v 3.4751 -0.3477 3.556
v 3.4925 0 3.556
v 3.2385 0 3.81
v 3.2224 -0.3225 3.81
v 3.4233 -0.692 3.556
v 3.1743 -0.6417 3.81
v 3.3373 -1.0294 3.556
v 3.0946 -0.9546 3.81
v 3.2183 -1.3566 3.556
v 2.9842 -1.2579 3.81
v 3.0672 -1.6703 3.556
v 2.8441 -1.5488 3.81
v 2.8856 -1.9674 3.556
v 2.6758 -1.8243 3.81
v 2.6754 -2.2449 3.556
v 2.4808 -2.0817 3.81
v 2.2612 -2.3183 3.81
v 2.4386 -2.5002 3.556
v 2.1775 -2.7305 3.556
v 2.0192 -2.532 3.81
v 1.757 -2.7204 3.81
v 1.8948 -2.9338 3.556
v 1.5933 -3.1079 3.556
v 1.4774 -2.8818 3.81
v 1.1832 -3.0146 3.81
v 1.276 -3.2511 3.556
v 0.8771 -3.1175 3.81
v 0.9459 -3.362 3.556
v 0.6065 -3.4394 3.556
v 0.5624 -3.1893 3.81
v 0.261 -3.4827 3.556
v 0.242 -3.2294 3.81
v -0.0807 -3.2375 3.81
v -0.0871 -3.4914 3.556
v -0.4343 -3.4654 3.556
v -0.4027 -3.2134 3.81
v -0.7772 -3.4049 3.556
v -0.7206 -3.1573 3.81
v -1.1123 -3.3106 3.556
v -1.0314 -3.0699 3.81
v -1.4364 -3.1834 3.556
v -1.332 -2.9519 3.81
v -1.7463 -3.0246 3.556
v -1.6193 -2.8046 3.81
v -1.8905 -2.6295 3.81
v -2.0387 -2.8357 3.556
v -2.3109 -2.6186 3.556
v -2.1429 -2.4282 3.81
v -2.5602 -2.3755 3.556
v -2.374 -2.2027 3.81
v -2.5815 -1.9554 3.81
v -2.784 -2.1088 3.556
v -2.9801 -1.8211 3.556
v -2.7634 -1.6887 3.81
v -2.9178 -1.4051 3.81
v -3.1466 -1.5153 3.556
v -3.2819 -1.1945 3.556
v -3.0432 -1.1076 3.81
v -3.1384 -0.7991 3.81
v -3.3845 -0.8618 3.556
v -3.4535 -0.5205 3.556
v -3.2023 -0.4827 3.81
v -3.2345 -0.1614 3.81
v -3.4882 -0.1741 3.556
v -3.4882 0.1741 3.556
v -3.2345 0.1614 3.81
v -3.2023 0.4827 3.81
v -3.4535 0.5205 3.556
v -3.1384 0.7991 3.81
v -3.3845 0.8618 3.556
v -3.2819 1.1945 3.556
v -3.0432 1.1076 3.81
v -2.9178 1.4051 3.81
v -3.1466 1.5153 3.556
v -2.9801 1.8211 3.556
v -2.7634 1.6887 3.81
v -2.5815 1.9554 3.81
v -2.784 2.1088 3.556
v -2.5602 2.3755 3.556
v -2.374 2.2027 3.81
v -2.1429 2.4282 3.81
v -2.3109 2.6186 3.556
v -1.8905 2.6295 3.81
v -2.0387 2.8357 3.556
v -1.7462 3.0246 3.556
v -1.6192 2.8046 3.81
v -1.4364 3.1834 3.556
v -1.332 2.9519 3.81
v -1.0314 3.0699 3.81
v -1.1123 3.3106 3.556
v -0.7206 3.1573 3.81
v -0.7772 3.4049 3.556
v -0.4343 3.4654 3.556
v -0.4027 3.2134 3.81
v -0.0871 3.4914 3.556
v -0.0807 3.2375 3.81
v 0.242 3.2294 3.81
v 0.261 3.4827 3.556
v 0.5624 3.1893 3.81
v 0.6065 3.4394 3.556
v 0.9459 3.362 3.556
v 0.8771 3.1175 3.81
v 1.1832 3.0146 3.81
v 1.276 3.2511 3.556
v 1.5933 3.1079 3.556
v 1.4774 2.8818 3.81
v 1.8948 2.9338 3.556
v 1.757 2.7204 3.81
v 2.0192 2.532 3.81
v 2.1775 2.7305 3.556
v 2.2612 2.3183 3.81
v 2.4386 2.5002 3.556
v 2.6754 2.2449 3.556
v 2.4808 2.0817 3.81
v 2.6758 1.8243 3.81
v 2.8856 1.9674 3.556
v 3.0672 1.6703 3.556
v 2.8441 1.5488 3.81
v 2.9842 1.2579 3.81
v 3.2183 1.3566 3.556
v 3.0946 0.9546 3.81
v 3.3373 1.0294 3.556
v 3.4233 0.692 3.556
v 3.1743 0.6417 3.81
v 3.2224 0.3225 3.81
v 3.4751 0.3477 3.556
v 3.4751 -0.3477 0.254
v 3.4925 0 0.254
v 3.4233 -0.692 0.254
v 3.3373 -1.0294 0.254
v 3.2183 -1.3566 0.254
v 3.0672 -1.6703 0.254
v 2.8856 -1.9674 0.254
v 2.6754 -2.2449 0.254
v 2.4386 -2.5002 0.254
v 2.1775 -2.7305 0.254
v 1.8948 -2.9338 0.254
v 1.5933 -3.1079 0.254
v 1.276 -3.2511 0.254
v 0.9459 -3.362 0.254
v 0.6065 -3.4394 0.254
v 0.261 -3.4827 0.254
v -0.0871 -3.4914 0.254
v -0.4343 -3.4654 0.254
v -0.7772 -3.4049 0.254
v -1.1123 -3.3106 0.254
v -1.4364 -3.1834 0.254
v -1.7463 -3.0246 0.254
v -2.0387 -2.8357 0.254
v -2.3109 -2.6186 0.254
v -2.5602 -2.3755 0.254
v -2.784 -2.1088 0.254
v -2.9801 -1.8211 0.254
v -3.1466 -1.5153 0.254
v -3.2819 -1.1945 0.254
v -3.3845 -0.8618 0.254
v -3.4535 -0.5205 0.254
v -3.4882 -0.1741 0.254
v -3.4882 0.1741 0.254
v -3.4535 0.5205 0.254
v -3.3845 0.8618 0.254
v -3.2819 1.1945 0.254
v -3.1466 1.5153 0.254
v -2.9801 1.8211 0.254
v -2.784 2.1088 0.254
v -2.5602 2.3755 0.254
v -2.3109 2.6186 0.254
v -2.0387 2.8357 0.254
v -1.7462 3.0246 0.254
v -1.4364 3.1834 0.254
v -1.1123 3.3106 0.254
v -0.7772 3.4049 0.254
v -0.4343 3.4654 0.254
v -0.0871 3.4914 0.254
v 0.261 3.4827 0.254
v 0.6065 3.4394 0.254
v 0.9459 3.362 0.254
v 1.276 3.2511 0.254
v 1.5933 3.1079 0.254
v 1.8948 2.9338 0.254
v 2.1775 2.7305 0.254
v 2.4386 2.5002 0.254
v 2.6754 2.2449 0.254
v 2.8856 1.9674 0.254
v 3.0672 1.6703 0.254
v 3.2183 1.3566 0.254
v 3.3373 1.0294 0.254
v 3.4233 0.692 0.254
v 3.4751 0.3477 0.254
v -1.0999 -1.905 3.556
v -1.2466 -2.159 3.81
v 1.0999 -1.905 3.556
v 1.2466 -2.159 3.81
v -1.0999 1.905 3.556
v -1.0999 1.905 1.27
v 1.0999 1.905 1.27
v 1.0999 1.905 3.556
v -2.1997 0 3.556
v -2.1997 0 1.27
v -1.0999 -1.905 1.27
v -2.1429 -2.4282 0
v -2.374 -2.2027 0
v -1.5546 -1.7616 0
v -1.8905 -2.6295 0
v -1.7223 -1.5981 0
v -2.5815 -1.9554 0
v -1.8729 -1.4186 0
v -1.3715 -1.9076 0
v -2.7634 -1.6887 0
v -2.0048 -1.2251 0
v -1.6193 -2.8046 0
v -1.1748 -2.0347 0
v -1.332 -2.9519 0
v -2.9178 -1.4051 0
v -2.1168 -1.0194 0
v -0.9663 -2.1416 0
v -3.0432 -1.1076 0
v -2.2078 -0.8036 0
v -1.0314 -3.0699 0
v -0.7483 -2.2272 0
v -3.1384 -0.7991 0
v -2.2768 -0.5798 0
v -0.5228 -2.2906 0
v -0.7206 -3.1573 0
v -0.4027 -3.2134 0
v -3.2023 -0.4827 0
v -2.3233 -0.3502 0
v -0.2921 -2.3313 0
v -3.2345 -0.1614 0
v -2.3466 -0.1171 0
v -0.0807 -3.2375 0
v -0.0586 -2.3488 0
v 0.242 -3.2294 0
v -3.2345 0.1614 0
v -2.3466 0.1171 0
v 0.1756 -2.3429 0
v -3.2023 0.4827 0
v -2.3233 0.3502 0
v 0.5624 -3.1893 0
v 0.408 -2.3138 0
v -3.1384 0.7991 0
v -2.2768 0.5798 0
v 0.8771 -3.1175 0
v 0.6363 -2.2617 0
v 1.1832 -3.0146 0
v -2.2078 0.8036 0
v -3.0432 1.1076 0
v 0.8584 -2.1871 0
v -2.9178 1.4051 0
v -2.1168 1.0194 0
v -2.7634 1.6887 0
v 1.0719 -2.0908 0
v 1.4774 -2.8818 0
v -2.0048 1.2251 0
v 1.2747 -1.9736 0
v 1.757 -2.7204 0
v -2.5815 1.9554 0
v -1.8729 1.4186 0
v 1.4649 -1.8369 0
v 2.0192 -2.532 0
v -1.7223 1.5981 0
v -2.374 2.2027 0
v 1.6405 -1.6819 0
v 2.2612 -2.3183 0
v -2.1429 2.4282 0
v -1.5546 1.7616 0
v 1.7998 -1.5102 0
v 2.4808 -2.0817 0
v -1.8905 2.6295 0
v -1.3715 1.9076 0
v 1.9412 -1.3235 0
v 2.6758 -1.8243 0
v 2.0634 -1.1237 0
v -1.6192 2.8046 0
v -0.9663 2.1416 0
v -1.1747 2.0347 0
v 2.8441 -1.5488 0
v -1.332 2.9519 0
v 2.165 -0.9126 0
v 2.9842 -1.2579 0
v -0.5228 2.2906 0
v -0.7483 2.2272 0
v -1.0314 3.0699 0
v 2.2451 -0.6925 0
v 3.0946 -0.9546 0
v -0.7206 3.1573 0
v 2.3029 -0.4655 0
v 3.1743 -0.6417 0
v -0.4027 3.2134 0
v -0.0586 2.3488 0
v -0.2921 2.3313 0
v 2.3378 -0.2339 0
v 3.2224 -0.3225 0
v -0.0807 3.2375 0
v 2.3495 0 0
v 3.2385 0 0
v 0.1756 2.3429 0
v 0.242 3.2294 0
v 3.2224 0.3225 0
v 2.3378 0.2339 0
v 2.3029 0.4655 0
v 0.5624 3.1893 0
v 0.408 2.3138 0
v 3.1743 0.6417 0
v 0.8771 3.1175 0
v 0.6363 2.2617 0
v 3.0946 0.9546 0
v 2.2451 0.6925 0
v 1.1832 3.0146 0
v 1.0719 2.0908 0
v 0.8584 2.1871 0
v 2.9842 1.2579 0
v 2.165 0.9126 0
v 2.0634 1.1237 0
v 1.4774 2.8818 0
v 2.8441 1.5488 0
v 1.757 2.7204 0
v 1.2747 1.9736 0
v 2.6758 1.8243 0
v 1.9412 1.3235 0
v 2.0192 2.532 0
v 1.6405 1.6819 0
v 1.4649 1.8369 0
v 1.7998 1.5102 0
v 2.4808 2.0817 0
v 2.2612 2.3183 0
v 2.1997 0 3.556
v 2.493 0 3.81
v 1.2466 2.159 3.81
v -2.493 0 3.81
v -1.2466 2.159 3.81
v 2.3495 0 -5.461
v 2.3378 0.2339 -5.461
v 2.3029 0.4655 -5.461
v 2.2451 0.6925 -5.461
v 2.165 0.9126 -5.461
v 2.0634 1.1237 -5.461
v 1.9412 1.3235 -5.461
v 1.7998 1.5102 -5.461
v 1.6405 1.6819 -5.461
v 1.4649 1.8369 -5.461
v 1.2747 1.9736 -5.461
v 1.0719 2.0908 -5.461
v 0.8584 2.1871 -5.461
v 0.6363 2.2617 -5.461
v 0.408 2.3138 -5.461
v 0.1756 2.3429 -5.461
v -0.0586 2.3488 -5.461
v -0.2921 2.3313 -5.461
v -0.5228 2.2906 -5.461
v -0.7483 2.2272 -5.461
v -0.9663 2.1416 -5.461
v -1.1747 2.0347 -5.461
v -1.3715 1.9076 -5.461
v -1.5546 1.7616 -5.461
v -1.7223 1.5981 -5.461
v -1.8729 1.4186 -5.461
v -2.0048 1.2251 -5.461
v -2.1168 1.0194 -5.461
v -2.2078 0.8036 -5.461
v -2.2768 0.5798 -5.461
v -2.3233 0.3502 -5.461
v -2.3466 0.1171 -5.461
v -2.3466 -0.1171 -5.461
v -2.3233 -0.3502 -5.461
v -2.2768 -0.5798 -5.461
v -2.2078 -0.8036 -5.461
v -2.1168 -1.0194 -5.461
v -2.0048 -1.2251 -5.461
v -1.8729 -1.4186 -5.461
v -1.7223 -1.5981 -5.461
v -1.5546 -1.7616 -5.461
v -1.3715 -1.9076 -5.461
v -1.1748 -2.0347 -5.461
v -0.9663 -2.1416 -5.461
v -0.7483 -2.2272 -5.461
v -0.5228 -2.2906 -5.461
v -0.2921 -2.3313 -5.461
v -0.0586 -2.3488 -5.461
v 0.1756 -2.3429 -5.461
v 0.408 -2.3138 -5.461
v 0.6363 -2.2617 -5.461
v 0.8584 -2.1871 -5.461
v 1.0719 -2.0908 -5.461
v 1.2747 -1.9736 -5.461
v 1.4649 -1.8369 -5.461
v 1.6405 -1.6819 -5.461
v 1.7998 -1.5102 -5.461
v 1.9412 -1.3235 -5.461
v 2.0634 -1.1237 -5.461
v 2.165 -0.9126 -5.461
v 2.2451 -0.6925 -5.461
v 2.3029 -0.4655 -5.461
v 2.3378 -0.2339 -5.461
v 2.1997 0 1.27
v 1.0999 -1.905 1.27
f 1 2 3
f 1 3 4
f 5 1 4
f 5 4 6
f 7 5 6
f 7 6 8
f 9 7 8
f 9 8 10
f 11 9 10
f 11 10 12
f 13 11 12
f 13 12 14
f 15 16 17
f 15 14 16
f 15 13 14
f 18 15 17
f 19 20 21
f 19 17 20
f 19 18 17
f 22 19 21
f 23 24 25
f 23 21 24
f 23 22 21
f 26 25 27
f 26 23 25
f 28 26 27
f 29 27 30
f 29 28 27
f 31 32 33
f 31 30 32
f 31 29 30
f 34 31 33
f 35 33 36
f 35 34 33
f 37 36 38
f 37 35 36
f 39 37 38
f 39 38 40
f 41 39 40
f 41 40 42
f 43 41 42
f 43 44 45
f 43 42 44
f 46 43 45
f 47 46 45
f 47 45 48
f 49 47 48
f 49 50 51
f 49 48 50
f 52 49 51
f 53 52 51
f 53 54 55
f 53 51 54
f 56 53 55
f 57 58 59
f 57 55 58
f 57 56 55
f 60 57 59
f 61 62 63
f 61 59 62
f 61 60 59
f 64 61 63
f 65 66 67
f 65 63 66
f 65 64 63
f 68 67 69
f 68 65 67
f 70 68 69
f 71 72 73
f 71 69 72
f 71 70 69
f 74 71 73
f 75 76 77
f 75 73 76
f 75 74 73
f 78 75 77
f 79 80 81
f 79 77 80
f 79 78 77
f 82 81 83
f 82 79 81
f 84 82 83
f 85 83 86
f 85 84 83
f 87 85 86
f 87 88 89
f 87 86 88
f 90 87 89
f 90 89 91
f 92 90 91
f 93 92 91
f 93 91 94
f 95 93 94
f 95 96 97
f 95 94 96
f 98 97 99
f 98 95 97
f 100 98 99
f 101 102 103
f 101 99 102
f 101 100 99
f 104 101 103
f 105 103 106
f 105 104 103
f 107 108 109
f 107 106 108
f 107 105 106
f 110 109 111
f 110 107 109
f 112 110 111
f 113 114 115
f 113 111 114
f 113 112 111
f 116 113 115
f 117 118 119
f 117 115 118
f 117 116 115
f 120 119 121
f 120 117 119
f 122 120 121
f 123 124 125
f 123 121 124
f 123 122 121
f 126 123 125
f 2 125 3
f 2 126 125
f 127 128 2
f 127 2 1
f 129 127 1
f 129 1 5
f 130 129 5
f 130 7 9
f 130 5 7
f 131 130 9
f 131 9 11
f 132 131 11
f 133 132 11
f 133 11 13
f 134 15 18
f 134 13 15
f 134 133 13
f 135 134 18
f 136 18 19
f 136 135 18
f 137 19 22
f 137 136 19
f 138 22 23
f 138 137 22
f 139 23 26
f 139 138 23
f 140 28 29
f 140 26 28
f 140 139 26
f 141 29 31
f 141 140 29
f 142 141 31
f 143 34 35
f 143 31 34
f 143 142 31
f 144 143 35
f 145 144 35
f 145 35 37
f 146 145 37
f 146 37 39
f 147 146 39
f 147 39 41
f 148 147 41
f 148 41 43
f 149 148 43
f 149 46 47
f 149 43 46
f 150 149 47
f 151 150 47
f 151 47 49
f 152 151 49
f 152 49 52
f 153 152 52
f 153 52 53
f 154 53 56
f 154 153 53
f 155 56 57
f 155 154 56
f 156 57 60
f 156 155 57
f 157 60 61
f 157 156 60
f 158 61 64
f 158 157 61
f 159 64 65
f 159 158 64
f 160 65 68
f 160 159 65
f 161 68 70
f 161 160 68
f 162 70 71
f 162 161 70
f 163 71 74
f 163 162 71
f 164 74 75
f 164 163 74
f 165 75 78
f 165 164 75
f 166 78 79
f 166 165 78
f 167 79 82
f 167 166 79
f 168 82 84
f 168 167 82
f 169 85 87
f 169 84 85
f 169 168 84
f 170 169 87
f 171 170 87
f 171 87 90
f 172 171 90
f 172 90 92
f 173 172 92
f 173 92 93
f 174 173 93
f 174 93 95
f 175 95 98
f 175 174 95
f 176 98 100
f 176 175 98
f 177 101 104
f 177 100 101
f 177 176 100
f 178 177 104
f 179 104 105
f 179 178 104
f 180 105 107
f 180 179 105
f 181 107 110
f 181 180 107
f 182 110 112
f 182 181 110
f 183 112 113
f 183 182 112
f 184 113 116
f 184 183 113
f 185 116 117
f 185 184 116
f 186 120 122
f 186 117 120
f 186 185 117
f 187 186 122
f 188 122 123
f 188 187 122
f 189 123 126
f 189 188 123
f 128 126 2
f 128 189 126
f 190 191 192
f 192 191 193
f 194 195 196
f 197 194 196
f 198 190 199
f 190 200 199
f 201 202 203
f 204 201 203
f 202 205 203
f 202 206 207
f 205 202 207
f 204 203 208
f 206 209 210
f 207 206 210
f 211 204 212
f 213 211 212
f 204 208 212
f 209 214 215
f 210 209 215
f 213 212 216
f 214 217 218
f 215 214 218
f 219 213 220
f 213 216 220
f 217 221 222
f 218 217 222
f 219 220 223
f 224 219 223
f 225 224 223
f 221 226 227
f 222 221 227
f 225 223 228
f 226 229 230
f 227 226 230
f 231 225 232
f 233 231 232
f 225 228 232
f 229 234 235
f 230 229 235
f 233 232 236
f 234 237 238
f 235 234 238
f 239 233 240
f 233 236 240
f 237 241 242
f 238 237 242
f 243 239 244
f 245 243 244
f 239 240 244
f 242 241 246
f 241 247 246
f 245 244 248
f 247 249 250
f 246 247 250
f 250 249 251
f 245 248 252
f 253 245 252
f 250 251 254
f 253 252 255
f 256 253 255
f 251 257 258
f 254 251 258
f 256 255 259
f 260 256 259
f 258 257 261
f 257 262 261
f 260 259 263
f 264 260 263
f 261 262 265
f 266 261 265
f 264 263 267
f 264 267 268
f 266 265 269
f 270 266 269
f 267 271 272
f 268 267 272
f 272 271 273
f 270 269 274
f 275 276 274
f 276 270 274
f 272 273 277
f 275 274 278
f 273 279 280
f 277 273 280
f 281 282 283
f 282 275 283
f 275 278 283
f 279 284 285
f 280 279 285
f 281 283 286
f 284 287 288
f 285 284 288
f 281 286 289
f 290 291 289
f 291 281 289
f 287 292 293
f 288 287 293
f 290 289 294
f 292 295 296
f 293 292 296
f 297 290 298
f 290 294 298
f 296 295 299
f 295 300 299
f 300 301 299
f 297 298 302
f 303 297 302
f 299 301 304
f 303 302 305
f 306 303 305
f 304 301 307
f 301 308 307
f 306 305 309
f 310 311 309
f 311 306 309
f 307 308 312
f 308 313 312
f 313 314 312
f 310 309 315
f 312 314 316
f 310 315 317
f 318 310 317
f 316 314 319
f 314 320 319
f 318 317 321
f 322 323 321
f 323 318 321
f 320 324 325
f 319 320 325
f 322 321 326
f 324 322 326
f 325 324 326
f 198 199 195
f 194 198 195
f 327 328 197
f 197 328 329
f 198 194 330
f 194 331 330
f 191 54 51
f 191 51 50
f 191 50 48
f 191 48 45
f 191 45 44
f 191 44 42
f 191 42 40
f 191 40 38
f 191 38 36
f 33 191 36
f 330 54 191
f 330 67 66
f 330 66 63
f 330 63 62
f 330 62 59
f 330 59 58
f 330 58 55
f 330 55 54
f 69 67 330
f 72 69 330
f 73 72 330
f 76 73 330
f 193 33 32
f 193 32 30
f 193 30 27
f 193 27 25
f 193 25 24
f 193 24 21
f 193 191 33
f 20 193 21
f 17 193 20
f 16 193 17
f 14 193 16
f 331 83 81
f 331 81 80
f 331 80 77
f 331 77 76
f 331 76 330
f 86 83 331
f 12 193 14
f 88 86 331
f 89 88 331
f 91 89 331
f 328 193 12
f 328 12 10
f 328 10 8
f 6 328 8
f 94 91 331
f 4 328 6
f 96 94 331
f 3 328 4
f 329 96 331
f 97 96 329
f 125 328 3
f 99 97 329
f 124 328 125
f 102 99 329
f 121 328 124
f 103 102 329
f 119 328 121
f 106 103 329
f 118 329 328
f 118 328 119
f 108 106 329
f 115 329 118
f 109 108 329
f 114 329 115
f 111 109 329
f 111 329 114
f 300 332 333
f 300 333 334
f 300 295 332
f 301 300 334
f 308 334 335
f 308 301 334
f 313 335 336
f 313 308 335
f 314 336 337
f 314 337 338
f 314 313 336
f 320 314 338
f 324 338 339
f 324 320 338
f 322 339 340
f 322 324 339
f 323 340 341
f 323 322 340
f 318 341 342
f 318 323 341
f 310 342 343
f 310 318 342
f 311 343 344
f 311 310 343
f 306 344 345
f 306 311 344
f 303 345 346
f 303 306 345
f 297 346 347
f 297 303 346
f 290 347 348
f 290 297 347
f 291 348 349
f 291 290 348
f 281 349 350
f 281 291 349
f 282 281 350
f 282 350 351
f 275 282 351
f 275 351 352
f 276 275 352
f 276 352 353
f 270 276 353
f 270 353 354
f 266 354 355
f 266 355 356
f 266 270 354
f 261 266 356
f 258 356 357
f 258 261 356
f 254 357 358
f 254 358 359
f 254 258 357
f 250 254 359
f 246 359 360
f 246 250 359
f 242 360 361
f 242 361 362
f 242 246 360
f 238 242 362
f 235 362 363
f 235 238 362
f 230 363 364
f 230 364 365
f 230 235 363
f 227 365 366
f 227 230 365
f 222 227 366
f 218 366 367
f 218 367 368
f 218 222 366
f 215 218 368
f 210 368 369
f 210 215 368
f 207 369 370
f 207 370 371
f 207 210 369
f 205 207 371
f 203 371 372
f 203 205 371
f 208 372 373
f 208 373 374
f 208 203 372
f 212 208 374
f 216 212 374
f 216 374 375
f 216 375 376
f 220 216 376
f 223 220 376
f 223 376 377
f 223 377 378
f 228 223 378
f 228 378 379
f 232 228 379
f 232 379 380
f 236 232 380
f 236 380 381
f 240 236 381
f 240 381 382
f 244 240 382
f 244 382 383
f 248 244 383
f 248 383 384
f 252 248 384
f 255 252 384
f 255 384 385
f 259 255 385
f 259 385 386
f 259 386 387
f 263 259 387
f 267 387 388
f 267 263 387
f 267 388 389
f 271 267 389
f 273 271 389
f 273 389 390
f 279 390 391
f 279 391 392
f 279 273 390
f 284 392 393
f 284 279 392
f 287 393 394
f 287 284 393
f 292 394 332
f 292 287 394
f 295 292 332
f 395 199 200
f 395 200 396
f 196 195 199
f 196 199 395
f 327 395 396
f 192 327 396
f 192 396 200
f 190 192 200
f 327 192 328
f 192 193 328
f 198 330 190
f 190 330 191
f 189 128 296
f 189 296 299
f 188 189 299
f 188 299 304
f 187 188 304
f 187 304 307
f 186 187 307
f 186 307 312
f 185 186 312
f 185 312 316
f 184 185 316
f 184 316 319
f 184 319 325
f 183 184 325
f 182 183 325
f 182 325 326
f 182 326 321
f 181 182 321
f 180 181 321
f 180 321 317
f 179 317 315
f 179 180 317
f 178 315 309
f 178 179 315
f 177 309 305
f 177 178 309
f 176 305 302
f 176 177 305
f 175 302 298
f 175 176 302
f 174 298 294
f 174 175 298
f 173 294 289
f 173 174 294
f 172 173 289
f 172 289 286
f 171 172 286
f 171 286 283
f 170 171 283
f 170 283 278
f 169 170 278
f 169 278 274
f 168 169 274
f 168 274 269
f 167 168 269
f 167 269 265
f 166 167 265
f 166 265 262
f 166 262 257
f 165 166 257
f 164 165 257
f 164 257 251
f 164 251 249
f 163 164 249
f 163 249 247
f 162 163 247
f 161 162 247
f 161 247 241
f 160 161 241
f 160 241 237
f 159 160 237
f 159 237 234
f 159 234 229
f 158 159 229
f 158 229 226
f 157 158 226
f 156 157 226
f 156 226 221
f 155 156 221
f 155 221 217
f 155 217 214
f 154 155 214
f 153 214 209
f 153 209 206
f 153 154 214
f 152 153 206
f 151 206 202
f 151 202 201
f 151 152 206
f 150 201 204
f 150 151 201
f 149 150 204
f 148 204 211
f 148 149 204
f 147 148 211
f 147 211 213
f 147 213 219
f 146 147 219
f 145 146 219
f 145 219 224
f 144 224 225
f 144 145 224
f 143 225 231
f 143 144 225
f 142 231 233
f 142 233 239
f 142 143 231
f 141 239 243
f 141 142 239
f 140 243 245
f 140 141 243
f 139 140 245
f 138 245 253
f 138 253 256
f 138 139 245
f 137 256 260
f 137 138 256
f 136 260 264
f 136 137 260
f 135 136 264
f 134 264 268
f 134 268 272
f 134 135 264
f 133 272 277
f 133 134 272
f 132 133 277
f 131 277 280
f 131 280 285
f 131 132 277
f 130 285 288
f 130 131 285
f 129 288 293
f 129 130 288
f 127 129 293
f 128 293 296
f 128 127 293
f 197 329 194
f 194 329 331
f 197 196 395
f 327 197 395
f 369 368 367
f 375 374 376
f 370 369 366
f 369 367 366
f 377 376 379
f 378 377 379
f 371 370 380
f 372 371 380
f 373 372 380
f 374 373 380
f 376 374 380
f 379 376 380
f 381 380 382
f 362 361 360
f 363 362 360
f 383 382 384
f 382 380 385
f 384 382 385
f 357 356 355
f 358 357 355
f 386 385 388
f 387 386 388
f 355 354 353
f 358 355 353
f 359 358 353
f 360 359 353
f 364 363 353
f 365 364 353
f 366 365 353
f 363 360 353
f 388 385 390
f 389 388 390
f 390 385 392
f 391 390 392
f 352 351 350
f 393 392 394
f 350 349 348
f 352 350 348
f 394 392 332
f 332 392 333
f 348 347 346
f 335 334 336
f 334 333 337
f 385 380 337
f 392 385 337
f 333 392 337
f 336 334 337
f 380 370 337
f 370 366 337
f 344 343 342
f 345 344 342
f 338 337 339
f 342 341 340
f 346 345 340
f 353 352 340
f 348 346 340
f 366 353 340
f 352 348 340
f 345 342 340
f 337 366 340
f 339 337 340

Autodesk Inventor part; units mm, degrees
ref_plane "YZ Plane" through (0, 0, 0) normal (1, 0, 0) x (0, 1, 0)
ref_plane "XZ Plane" through (0, 0, 0) normal (0, 1, 0) x (-1, 0, 0)
ref_plane "XY Plane" through (0, 0, 0) normal (0, 0, 1) x (1, 0, 0)
sketch "Sketch1" plane through (0, 0, 0) normal (0, 0, 1) x (1, 0, 0)
  circle A0 centre (0, 0) radius 3.4925
  circle A1 centre (0, 0) radius 2.3495
  line L0 (2.1997, 0) -> (1.0999, -1.905)
  line L1 (1.0999, -1.905) -> (-1.0999, -1.905)
  line L2 (-1.0999, -1.905) -> (-2.1997, 0)
  line L3 (-2.1997, 0) -> (-1.0999, 1.905)
  line L4 (-1.0999, 1.905) -> (1.0999, 1.905)
  line L5 (1.0999, 1.905) -> (2.1997, 0)
  dimension "d0" = 6.985
  dimension "d1" = 4.699
  dimension "d2" = 3.81
extrude "Extrusion1" add sketch "Sketch1" along normal blind 3.81 contours A0 | A1
extrude "Extrusion2" add sketch "Sketch1" against normal blind 5.461 contours A1 | L0 L1 L2 L3 L4 L5
extrude "Extrusion3" add sketch "Sketch1" along normal blind 1.27 contours L0 L1 L2 L3 L4 L5
thread "Thread1" size "10-32 UNF" class "2A" standard "ANSI Unified Screw Threads" full length
chamfer "Chamfer1" distance 0.254 angle 45 8 edges at (-3.4925, 0, 3.81) (-3.4925, 0, 0) (-1.6498, 0.9525, 3.81) (-1.6498, -0.9525, 3.81) (0, -1.905, 3.81) (1.6498, -0.9525, 3.81) (1.6498, 0.9525, 3.81) (0, 1.905, 3.81)
properties part number "Gearbox Hex Machine Screw 3" material "Steel"
